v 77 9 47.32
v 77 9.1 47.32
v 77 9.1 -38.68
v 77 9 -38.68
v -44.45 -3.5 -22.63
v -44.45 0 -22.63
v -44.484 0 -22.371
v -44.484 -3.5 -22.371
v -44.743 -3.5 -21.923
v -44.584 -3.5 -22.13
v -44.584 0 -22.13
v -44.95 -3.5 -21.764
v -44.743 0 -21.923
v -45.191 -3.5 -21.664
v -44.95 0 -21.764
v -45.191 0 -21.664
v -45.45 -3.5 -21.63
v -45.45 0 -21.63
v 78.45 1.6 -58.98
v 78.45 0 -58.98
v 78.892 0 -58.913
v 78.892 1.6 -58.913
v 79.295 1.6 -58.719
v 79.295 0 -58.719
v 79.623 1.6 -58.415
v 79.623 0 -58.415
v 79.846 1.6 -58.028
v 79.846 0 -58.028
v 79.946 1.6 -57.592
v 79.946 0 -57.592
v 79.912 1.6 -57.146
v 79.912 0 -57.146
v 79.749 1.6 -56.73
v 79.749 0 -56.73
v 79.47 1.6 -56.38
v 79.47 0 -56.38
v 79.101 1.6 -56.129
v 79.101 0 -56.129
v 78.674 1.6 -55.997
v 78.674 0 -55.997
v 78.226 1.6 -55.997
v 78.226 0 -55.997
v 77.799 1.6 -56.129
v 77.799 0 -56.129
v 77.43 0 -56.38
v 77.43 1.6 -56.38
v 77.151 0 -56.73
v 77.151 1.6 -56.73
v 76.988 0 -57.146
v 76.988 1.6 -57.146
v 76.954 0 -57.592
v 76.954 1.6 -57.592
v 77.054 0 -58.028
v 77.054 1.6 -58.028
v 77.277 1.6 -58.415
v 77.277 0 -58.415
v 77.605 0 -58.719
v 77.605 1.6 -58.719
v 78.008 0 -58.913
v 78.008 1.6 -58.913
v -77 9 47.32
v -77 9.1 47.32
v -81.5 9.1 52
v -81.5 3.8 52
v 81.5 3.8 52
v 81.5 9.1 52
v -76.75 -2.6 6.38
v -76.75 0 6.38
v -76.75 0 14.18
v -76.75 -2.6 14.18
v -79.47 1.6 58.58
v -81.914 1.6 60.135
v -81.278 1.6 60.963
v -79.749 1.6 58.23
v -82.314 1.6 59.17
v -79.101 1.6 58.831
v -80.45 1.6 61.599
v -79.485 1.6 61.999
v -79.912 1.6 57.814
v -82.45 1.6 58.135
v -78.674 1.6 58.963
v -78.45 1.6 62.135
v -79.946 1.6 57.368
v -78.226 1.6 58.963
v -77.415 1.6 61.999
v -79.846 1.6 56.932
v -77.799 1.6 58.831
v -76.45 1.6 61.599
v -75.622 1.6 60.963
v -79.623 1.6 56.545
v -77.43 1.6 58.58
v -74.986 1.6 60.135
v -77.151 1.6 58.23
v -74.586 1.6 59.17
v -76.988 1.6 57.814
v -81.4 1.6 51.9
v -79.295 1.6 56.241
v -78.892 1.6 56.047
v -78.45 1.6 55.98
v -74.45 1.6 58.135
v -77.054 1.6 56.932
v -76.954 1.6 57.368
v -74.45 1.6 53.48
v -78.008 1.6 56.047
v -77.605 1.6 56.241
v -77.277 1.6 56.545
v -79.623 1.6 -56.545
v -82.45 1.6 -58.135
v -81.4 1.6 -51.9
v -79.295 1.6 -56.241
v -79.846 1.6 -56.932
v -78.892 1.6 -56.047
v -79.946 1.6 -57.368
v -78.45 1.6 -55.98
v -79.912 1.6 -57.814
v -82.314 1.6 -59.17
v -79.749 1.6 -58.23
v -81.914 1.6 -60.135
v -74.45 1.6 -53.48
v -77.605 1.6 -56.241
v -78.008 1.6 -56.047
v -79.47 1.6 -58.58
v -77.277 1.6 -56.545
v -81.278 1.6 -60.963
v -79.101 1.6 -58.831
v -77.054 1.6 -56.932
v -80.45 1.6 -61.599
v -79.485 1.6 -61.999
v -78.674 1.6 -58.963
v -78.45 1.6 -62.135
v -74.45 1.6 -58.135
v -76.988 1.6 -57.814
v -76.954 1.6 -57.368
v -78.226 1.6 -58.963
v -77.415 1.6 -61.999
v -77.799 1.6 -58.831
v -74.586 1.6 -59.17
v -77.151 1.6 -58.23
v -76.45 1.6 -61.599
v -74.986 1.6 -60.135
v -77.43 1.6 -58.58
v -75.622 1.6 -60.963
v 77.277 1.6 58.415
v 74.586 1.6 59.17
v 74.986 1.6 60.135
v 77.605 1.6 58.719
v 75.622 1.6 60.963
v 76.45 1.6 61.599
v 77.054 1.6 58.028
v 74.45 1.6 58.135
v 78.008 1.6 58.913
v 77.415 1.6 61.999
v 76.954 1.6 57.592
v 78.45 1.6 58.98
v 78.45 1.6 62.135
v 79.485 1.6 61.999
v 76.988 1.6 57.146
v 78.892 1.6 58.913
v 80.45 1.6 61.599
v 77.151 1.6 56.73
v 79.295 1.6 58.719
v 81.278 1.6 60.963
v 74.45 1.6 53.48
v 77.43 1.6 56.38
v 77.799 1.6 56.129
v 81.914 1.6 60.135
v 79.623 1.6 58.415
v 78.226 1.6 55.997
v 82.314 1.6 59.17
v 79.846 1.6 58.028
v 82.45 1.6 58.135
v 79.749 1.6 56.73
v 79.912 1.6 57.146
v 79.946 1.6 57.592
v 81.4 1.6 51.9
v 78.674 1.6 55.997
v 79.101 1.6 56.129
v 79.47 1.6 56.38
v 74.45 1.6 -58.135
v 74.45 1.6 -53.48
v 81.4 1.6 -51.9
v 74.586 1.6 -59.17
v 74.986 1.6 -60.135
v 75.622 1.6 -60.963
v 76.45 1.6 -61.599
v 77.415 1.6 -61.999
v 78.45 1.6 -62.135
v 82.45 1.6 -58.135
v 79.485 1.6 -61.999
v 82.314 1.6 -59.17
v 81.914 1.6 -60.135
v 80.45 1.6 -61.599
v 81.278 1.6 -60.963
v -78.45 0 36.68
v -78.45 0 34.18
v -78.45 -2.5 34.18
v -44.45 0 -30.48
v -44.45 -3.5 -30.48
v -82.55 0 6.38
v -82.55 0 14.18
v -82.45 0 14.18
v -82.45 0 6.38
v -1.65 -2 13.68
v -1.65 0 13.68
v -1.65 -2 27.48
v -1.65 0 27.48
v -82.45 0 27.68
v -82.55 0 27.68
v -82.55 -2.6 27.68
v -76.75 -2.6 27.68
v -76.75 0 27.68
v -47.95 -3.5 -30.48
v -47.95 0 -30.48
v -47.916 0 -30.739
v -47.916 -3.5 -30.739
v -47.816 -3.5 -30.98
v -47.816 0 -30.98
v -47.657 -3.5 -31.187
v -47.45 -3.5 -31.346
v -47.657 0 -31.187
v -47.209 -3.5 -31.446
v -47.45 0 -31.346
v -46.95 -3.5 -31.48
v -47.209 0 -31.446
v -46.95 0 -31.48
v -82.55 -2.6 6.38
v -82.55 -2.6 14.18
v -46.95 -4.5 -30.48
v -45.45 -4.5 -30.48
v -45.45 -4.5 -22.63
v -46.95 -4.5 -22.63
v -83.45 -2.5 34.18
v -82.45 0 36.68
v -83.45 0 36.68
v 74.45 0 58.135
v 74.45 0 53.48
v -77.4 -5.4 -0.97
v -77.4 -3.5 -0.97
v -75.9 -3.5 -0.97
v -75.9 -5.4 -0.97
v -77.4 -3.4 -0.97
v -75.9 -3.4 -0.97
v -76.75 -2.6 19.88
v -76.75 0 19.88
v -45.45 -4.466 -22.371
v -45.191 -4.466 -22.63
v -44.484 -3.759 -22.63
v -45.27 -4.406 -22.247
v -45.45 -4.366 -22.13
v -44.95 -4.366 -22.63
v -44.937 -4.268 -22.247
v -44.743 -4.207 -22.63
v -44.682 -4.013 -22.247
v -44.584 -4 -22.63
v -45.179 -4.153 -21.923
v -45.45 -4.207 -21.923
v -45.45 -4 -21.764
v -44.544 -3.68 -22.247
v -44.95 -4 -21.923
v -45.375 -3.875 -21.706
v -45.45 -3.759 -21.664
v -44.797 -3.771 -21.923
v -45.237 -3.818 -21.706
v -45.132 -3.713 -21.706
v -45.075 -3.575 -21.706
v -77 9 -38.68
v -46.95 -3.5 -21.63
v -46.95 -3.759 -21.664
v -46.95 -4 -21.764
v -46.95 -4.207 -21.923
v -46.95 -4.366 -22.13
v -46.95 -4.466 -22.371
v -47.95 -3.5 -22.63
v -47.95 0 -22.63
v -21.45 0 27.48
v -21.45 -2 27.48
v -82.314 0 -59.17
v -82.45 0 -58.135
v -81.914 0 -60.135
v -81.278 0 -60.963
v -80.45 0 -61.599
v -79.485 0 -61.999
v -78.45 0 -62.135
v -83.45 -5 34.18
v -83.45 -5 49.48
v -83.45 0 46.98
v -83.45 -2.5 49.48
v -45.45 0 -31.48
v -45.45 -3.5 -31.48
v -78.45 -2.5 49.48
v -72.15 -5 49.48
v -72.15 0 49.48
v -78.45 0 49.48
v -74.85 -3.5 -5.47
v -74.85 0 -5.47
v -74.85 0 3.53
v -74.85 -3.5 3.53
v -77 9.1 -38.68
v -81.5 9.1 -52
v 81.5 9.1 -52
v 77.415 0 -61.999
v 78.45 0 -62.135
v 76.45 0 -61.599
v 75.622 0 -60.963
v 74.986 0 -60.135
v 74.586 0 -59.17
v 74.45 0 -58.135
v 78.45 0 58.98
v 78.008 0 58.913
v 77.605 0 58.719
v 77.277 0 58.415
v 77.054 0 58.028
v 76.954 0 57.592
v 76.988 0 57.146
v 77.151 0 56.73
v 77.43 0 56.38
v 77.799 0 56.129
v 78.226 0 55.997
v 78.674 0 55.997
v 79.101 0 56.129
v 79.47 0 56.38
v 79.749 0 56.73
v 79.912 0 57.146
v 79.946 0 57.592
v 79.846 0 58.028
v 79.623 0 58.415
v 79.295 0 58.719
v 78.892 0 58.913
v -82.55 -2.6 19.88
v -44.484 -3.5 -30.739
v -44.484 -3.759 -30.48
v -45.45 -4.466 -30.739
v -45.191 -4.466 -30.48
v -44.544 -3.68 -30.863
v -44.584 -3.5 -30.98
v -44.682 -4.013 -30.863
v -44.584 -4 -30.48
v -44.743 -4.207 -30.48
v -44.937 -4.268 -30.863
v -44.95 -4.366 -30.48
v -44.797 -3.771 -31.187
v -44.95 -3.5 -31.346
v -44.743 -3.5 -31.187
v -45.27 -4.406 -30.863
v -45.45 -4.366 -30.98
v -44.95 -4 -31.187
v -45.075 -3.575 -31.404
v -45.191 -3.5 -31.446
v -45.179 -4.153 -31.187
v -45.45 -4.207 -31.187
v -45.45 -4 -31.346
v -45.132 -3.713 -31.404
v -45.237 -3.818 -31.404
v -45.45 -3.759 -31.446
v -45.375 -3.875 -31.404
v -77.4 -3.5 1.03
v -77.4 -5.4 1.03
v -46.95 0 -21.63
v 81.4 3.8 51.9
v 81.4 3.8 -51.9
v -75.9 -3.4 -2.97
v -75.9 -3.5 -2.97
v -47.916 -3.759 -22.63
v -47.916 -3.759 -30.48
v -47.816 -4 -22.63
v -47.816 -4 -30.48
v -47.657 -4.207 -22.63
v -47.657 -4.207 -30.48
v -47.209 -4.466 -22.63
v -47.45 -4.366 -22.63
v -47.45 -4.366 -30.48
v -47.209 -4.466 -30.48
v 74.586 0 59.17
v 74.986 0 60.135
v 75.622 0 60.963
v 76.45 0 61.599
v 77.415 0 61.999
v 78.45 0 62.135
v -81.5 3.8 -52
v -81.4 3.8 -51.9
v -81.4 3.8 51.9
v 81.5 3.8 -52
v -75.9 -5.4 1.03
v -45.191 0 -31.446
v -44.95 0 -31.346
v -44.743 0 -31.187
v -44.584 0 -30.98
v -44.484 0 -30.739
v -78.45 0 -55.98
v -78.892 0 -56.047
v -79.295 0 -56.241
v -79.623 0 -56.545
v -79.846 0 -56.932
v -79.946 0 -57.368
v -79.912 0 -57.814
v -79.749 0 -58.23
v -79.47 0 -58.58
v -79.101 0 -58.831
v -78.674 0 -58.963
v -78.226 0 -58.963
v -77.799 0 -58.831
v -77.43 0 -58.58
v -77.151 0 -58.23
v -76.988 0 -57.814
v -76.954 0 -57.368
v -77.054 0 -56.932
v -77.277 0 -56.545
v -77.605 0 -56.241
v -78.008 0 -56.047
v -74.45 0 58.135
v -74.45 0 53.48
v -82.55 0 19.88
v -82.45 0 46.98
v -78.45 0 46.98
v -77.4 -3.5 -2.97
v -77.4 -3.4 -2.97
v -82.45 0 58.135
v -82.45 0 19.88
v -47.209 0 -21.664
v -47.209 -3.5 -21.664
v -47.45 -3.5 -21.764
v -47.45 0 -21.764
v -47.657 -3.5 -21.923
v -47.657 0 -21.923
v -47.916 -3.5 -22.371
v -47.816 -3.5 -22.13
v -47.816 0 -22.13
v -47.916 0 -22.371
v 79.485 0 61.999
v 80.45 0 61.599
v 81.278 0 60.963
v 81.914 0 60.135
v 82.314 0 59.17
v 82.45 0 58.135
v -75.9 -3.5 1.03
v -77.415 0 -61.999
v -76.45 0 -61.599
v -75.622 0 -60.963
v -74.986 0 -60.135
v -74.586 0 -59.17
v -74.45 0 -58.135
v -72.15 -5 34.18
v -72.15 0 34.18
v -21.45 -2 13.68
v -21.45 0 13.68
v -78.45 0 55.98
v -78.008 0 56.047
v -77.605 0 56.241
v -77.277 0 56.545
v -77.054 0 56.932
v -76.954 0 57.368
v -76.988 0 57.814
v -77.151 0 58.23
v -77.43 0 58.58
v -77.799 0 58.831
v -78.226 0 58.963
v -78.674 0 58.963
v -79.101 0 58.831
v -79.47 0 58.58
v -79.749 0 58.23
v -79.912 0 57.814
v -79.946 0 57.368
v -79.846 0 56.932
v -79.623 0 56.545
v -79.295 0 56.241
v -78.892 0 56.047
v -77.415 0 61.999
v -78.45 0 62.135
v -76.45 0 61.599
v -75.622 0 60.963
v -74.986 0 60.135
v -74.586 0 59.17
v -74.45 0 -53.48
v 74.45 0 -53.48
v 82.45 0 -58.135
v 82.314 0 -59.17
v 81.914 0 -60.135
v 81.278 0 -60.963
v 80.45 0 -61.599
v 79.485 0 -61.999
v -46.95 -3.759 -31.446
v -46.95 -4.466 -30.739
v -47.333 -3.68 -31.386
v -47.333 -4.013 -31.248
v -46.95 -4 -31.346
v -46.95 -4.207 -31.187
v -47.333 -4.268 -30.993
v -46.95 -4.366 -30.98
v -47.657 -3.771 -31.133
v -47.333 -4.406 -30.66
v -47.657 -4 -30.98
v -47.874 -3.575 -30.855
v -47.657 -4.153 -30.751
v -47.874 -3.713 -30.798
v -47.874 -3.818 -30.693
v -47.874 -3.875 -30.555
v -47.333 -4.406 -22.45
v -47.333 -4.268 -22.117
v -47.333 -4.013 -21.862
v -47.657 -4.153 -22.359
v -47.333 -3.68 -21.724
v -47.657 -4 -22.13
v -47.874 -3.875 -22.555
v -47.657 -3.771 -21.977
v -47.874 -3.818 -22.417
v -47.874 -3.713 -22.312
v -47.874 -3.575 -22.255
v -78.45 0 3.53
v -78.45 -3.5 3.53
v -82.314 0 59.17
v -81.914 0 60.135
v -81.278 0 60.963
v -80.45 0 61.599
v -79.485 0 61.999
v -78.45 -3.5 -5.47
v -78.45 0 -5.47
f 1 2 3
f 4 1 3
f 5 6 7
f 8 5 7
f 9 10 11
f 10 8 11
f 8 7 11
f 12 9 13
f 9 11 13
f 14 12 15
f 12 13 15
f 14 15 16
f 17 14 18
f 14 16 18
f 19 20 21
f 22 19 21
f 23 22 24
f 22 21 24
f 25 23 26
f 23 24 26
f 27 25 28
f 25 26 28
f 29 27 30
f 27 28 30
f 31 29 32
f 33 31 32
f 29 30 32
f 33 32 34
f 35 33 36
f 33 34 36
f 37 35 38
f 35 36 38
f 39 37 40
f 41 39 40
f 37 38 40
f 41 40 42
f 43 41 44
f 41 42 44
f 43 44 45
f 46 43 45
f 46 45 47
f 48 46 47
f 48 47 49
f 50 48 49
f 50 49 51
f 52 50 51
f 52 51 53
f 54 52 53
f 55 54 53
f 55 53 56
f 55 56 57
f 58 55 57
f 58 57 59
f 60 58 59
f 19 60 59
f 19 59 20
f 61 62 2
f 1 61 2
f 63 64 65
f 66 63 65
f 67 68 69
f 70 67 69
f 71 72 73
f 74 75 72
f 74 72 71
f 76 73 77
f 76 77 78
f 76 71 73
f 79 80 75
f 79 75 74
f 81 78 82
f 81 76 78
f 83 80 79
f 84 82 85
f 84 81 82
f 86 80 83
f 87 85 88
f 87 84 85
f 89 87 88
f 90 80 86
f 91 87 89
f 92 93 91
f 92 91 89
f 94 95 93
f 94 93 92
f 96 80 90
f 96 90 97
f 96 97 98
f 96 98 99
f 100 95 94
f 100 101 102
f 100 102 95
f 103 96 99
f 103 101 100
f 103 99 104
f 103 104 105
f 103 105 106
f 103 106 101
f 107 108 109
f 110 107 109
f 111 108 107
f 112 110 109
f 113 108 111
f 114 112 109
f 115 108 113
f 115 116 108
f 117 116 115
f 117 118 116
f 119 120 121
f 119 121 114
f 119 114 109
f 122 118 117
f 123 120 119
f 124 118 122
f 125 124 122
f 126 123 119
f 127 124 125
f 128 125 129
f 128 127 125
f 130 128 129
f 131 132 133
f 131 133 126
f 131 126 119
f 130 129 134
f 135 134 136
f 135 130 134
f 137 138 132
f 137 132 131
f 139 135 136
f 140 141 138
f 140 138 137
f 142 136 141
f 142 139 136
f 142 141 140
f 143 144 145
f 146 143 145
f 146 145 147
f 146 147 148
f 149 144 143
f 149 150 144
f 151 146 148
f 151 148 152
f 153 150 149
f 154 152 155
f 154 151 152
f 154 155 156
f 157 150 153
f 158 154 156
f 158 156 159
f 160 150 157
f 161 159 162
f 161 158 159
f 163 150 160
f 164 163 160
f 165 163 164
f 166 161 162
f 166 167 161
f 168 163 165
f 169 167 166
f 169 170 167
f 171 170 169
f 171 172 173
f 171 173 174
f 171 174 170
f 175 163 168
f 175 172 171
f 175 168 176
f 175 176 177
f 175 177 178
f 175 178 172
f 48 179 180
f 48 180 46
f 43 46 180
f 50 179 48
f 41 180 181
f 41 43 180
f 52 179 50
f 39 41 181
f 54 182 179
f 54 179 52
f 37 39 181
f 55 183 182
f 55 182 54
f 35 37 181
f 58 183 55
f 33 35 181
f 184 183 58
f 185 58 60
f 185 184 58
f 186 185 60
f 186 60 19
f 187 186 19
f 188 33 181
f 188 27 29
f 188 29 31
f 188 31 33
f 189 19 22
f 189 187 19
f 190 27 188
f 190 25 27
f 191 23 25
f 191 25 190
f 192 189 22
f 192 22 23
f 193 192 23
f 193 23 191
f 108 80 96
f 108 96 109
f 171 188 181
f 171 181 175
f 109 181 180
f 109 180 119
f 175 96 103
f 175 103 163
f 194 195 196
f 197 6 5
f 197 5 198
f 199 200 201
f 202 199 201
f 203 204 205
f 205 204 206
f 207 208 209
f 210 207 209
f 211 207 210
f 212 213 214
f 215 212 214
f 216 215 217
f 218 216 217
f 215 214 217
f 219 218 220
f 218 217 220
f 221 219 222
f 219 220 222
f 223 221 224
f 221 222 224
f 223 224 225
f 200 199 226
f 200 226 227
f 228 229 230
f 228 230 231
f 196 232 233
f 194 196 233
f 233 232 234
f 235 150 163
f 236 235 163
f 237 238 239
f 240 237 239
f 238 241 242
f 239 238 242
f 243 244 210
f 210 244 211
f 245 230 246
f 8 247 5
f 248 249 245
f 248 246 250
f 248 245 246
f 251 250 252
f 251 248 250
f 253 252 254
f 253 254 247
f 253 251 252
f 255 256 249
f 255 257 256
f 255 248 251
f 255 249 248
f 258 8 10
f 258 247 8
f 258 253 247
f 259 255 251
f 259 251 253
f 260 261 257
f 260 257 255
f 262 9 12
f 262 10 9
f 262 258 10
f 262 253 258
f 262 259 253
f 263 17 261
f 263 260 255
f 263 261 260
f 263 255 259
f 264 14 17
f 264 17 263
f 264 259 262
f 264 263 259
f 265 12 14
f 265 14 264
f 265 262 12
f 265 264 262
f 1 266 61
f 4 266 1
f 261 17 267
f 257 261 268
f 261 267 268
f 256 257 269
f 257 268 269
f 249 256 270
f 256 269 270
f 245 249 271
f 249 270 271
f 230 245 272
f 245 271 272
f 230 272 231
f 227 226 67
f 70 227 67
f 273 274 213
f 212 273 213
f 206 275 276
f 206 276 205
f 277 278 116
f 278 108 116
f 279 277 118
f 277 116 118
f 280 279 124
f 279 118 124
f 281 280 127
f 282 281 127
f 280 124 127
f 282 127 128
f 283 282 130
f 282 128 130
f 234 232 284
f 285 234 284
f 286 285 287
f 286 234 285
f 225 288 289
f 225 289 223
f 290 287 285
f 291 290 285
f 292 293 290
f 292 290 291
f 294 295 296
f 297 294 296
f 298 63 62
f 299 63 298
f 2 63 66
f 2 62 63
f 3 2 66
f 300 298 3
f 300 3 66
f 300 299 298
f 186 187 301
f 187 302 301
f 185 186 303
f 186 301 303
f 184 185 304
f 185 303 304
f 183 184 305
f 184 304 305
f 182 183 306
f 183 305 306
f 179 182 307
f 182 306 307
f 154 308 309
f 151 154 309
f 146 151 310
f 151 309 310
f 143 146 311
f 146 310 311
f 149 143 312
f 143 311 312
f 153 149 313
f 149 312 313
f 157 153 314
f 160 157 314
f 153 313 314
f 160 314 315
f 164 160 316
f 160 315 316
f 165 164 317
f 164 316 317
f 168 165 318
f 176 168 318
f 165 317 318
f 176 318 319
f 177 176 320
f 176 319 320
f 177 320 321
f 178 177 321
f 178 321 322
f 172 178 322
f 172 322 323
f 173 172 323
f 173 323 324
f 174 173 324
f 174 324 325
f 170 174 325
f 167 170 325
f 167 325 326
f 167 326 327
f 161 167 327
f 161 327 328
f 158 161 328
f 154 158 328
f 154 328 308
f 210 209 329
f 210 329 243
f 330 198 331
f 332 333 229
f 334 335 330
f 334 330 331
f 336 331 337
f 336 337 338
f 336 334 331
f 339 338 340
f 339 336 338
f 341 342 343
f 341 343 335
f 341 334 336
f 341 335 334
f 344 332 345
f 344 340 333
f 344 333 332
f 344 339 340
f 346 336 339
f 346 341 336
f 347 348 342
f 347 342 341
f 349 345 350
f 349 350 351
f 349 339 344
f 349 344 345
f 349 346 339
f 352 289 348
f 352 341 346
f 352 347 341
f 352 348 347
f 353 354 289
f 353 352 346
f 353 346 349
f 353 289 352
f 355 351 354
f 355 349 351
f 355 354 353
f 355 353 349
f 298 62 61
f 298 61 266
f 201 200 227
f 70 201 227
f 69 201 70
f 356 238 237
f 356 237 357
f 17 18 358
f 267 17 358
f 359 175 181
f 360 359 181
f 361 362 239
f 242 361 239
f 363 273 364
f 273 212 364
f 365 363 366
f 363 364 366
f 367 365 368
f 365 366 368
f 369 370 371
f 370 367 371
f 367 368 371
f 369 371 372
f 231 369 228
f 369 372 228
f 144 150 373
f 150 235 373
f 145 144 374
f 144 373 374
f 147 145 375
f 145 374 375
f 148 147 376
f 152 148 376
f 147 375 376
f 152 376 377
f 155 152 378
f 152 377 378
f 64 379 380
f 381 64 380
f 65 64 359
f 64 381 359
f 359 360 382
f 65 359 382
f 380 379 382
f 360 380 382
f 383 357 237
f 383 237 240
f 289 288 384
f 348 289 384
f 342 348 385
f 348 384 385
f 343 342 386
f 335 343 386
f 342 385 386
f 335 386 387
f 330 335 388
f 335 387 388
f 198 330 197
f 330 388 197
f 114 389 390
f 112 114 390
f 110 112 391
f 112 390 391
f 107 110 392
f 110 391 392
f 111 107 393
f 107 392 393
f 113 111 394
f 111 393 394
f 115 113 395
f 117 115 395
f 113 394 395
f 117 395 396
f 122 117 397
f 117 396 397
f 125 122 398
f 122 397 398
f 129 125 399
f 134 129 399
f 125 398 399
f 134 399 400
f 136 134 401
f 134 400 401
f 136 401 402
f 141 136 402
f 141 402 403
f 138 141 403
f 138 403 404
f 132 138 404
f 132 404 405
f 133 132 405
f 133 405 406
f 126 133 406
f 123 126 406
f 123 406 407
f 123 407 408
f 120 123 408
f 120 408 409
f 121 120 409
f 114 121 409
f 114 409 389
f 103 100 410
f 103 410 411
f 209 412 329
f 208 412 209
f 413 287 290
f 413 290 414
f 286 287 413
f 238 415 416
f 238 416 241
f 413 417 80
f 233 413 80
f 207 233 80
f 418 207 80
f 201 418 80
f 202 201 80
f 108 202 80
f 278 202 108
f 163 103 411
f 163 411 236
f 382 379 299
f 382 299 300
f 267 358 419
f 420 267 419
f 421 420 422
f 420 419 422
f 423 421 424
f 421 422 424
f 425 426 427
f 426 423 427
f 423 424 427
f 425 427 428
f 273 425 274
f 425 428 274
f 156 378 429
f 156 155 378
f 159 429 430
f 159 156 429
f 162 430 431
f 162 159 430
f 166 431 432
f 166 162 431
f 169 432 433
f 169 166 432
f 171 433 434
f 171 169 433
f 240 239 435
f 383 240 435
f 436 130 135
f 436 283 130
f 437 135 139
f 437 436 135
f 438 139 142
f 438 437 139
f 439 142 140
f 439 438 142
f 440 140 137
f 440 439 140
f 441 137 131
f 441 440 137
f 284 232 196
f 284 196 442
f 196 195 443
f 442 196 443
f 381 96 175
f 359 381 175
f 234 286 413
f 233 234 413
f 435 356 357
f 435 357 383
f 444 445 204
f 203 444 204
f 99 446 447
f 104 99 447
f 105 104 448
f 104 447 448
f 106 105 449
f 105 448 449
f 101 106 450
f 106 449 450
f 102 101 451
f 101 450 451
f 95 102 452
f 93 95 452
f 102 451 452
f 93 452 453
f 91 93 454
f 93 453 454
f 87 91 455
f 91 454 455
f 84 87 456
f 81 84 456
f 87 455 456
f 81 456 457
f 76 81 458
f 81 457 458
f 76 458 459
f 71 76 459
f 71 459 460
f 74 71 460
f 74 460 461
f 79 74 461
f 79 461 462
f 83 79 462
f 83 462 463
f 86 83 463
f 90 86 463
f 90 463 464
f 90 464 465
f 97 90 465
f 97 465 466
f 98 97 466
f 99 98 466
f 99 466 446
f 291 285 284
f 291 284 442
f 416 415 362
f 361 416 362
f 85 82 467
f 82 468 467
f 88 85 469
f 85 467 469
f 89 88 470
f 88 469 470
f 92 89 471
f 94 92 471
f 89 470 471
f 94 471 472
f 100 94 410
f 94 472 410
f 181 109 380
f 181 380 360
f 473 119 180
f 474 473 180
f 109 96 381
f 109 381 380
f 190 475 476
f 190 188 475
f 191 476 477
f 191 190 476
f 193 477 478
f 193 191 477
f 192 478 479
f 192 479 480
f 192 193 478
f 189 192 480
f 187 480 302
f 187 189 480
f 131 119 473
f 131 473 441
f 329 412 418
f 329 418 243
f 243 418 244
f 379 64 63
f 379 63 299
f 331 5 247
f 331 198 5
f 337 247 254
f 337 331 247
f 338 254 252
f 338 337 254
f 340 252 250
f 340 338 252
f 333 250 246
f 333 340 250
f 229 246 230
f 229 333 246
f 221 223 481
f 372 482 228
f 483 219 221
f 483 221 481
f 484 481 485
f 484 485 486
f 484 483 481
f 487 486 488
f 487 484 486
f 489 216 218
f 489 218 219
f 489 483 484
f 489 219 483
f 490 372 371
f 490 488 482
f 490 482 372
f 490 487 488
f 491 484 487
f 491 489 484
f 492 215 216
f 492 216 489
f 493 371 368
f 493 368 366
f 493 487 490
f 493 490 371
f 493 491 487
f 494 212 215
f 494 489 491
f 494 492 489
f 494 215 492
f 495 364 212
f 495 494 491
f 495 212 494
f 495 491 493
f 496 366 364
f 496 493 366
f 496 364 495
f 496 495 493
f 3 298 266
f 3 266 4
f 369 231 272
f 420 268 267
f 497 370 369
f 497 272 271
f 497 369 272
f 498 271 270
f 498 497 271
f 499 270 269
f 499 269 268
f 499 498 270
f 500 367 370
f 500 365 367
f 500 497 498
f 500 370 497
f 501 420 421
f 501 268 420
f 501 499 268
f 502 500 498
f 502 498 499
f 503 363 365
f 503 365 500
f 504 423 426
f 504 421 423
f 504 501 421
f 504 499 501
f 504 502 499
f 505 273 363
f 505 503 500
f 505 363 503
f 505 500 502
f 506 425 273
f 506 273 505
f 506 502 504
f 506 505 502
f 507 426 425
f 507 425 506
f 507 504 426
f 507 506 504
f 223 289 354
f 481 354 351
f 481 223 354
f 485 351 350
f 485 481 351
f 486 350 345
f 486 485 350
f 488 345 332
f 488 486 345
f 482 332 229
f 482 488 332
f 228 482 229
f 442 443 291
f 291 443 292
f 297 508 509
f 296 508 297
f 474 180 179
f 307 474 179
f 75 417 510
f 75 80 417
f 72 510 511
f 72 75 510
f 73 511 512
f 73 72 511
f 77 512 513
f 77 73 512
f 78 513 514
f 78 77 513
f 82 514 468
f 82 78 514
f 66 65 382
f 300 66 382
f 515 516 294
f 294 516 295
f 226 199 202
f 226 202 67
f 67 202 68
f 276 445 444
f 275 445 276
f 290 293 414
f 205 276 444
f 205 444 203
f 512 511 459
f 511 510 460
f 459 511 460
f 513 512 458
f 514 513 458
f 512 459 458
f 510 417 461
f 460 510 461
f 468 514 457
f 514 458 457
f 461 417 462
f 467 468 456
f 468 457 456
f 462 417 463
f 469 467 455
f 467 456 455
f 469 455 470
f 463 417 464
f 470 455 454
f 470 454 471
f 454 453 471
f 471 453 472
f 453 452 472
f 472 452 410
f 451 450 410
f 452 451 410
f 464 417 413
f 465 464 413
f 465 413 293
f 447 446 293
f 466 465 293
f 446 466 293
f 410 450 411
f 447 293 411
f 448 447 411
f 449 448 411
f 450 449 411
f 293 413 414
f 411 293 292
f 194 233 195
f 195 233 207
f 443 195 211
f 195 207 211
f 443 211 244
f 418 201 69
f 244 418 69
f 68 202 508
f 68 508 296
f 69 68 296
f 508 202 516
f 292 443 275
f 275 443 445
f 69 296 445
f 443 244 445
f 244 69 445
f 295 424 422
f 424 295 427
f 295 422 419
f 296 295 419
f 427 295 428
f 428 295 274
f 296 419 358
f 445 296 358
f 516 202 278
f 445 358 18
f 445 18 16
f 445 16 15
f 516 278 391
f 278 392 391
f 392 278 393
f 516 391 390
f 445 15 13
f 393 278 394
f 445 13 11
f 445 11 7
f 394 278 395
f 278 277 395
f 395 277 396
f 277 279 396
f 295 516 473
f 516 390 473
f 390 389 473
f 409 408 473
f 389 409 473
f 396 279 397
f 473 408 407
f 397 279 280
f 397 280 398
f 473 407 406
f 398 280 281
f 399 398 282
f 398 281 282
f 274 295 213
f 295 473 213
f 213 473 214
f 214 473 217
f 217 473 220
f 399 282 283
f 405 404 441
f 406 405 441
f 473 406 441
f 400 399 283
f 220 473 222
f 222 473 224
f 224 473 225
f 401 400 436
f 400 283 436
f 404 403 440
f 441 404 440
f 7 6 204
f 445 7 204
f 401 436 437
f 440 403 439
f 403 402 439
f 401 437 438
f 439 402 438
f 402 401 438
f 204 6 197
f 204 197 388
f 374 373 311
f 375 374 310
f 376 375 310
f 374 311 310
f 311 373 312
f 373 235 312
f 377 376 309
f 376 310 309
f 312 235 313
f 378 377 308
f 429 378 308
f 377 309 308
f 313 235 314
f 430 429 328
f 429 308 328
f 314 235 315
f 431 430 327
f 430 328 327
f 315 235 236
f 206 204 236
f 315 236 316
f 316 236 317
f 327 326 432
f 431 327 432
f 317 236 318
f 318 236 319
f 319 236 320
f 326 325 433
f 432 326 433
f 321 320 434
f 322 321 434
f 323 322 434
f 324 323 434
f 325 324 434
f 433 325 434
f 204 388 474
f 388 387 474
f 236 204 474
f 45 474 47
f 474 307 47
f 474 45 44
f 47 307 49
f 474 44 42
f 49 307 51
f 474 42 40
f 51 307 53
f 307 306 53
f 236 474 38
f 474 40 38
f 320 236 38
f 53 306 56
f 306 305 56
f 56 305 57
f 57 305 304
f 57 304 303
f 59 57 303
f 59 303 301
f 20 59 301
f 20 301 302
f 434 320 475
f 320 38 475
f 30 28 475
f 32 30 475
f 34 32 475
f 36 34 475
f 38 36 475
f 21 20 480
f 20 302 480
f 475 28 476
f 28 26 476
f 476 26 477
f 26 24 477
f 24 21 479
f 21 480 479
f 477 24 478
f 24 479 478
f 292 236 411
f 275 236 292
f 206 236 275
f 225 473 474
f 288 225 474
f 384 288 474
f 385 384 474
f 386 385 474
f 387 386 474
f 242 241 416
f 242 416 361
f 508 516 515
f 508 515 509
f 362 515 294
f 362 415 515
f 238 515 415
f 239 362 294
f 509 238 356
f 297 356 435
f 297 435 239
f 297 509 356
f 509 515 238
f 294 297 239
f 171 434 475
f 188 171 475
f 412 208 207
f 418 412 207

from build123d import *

# Parameters (mm, degrees)
SKETCH_1_W          = 164.9
SKETCH_1_H          = 124.27
EXTRUDE_2_DEPTH     = 1.6
SKETCH_2_W          = 148.9
SKETCH_2_H          = 8.655
CUT_EXTRUDE_1_DEPTH = 104.253671726
SKETCH_3_W          = 163
SKETCH_3_H          = 104
EXTRUDE_4_DEPTH     = 7.5
SKETCH_4_W          = 11.3
SKETCH_4_H          = 15.3
EXTRUDE_5_DEPTH     = 5
SKETCH_6_W          = 3.5
SKETCH_6_H          = 9.85
EXTRUDE_6_DEPTH     = 4.5
FILLET_1_R          = 1
FILLET_2_R          = 1
SKETCH_7_R          = 1.5
CUT_EXTRUDE_3_DEPTH = 105.438837245
FILLET_3_R          = 4
SKETCH_9_W          = 154
SKETCH_9_H          = 86
CUT_EXTRUDE_5_DEPTH = 0.1
CUT_EXTRUDE_6_DEPTH = 5
SKETCH_11_W         = 5.8
SKETCH_11_H         = 7.8
EXTRUDE_7_DEPTH     = 2.6
SKETCH_12_W         = 3.6
SKETCH_12_H         = 9
EXTRUDE_8_DEPTH     = 3.5
SKETCH_13_W         = 1.5
SKETCH_13_H         = 4
CUT_EXTRUDE_7_DEPTH = 0.1
SKETCH_14_W         = 1.5
SKETCH_14_H         = 2
EXTRUDE_9_DEPTH     = 2
SKETCH_15_W         = 19.8
SKETCH_15_H         = 13.8
EXTRUDE_10_DEPTH    = 2
SKETCH_16_W         = 163
SKETCH_16_H         = 104
SKETCH_16_W_2       = 162.8
SKETCH_16_H_2       = 103.8
CUT_EXTRUDE_9_DEPTH = 2.2


# Some blends are built 0.0001 mm under size
with BuildPart() as part:
    # 草图1 → 凸台-拉伸2 (new body)
    with BuildSketch(Plane(origin=(0, 0, 0), x_dir=(1, 0, 0), z_dir=(0, 1, 0))):
        Rectangle(SKETCH_1_W, SKETCH_1_H)
    extrude(amount=EXTRUDE_2_DEPTH)

    # 草图2 → 切除-拉伸1 (cut, through all)
    with BuildSketch(Plane(origin=(0, 1.6, 0), x_dir=(1, 0, 0), z_dir=(0, 1, 0))):
        with Locations((0, 57.8075)):
            Rectangle(SKETCH_2_W, SKETCH_2_H)
        with Locations((0, -57.8075)):
            Rectangle(SKETCH_2_W, SKETCH_2_H)
    extrude(amount=-CUT_EXTRUDE_1_DEPTH, mode=Mode.SUBTRACT)

    # 草图3 → 凸台-拉伸4 (add)
    with BuildSketch(Plane(origin=(0, 1.6, 0), x_dir=(1, 0, 0), z_dir=(0, 1, 0))):
        Rectangle(SKETCH_3_W, SKETCH_3_H)
    extrude(amount=EXTRUDE_4_DEPTH)

    # 草图4 → 凸台-拉伸5 (add)
    with BuildSketch(Plane.XZ):
        with Locations((-77.8, 41.83)):
            Rectangle(SKETCH_4_W, SKETCH_4_H)
    extrude(amount=EXTRUDE_5_DEPTH)

    # 草图6 → 凸台-拉伸6 (add)
    with BuildSketch(Plane(origin=(0, 0, 0), x_dir=(-1, 0, 0), z_dir=(0, -1, 0))):
        with Locations((46.2, 26.555)):
            Rectangle(SKETCH_6_W, SKETCH_6_H)
    extrude(amount=EXTRUDE_6_DEPTH)

    # 圆角1
    fillet_1_edges = [part.edges().sort_by_distance(p)[0] for p in [
        (-44.45, -4.5, -26.555),
        (-46.2, -4.5, -21.63),
        (-47.95, -4.5, -26.555),
        (-46.2, -4.5, -31.48),
    ]]
    fillet(fillet_1_edges, radius=FILLET_1_R)

    # 圆角2
    # the kernel refuses this fillet: 1 mm, written as the material it takes off along each edge
    with BuildSketch(Plane(origin=(-46.95, -3.5, -22.63), x_dir=(0, 0, 1), z_dir=(-1, 0, 0))) as fillet_2_piece_1_section:
        Polygon((0, 0), (FILLET_2_R, 0), (FILLET_2_R, -FILLET_2_R), (0, -FILLET_2_R), align=None)
    fillet_2_piece_1 = extrude(amount=FILLET_2_R, mode=Mode.PRIVATE)
    fillet_2_piece_1 = fillet_2_piece_1 - Plane(origin=(-46.95, -3.5, -22.63), x_dir=(0, 0.7071067811865475, -0.7071067811865475), z_dir=(-1, 0, 0)) * Sphere(FILLET_2_R, mode=Mode.PRIVATE)
    add(fillet_2_piece_1, mode=Mode.SUBTRACT)
    with BuildSketch(Plane(origin=(-45.45, -3.5, -22.63), x_dir=(1, 0, 0), z_dir=(0, 0, 1))) as fillet_2_piece_2_section:
        Polygon((0, 0), (FILLET_2_R, 0), (FILLET_2_R, -FILLET_2_R), (0, -FILLET_2_R), align=None)
    fillet_2_piece_2 = extrude(amount=FILLET_2_R, mode=Mode.PRIVATE)
    fillet_2_piece_2 = fillet_2_piece_2 - Plane(origin=(-45.45, -3.5, -22.63), x_dir=(-0.7071067811865475, 0.7071067811865475, 0), z_dir=(0, 0, 1)) * Sphere(FILLET_2_R, mode=Mode.PRIVATE)
    add(fillet_2_piece_2, mode=Mode.SUBTRACT)
    with BuildSketch(Plane(origin=(-46.95, -3.5, -30.48), x_dir=(0, 0, -1), z_dir=(-1, 0, 0))) as fillet_2_piece_3_section:
        Polygon((0, 0), (FILLET_2_R, 0), (FILLET_2_R, FILLET_2_R), (0, FILLET_2_R), align=None)
    fillet_2_piece_3 = extrude(amount=FILLET_2_R, mode=Mode.PRIVATE)
    fillet_2_piece_3 = fillet_2_piece_3 - Plane(origin=(-46.95, -3.5, -30.48), x_dir=(0, 0.7071067811865475, 0.7071067811865475), z_dir=(-1, 0, 0)) * Sphere(FILLET_2_R, mode=Mode.PRIVATE)
    add(fillet_2_piece_3, mode=Mode.SUBTRACT)
    with BuildSketch(Plane(origin=(-45.45, -3.5, -30.48), x_dir=(1, 0, 0), z_dir=(0, 0, -1))) as fillet_2_piece_4_section:
        Polygon((0, 0), (FILLET_2_R, 0), (FILLET_2_R, FILLET_2_R), (0, FILLET_2_R), align=None)
    fillet_2_piece_4 = extrude(amount=FILLET_2_R, mode=Mode.PRIVATE)
    fillet_2_piece_4 = fillet_2_piece_4 - Plane(origin=(-45.45, -3.5, -30.48), x_dir=(-0.7071067811865475, 0.7071067811865475, 0), z_dir=(0, 0, -1)) * Sphere(FILLET_2_R, mode=Mode.PRIVATE)
    add(fillet_2_piece_4, mode=Mode.SUBTRACT)
    with BuildSketch(Plane(origin=(-44.45, 0, -31.48), x_dir=(-1, 0, 0), z_dir=(0, -1, 0)), Plane(origin=(-47.95, 0, -31.48), x_dir=(0, 0, 1), z_dir=(0, -1, 0))) as fillet_2_piece_5:
        with BuildLine():
            CenterArc((FILLET_2_R, -FILLET_2_R), FILLET_2_R, 90, 90)
            Line((0, -FILLET_2_R), (0, 0))
            Line((0, 0), (FILLET_2_R, 0))
        make_face()
    extrude(amount=3.5, mode=Mode.SUBTRACT)
    with BuildSketch(Plane(origin=(-47.95, 0, -21.63), x_dir=(0, 0, -1), z_dir=(0, -1, 0)), Plane(origin=(-44.45, 0, -21.63), x_dir=(-1, 0, 0), z_dir=(0, -1, 0))) as fillet_2_piece_6:
        with BuildLine():
            CenterArc((FILLET_2_R, FILLET_2_R), FILLET_2_R, 180, 90)
            Line((0, FILLET_2_R), (0, 0))
            Line((0, 0), (FILLET_2_R, 0))
        make_face()
    extrude(amount=3.5, mode=Mode.SUBTRACT)

    # 草图7 → 切除-拉伸3 (cut, through all)
    with BuildSketch(Plane.XZ):
        with Locations(Location((-78.45, 57.48, 0), (0, 0, 270))):
            Circle(SKETCH_7_R)
        with Locations(Location((78.45, 57.48, 0), (0, 0, 90))):
            Circle(SKETCH_7_R)
        with Locations(Location((78.45, -57.48, 0), (0, 0, 270))):
            Circle(SKETCH_7_R)
        with Locations(Location((-78.45, -57.48, 0), (0, 0, 90))):
            Circle(SKETCH_7_R)
    extrude(amount=-CUT_EXTRUDE_3_DEPTH, mode=Mode.SUBTRACT)

    # 圆角3
    fillet_3_edges = [part.edges().sort_by_distance(p)[0] for p in [
        (-74.45, 0.8, -62.135),
        (-82.45, 0.8, -62.135),
        (82.45, 0.8, -62.135),
        (74.45, 0.8, -62.135),
        (74.45, 0.8, 62.135),
        (82.45, 0.8, 62.135),
        (-74.45, 0.8, 62.135),
        (-82.45, 0.8, 62.135),
    ]]
    fillet(fillet_3_edges, radius=FILLET_3_R - 0.0001)  # a hair under: the kernel refuses the full size

    # 草图9 → 切除-拉伸5 (cut)
    with BuildSketch(Plane(origin=(0, 9.1, 0), x_dir=(1, 0, 0), z_dir=(0, 1, 0))):
        with Locations((0, -4.32)):
            Rectangle(SKETCH_9_W, SKETCH_9_H)
    extrude(amount=-CUT_EXTRUDE_5_DEPTH, mode=Mode.SUBTRACT)

    # 草图10 → 切除-拉伸6 (cut)
    with BuildSketch(Plane.ZY.offset(83.45)):
        Polygon((49.48, -2.5), (46.98, 0), (49.48, 0), align=None)
        Polygon((34.18, 0), (34.18, -2.5), (36.68, 0), align=None)
    extrude(amount=-CUT_EXTRUDE_6_DEPTH, mode=Mode.SUBTRACT)

    # 草图11 → 凸台-拉伸7 (add)
    with BuildSketch(Plane.XZ):
        with Locations((-79.65, 23.78)):
            Rectangle(SKETCH_11_W, SKETCH_11_H)
        with Locations((-79.65, 10.28)):
            Rectangle(SKETCH_11_W, SKETCH_11_H)
    extrude(amount=EXTRUDE_7_DEPTH)

    # 草图12 → 凸台-拉伸8 (add)
    with BuildSketch(Plane.XZ):
        with Locations((-76.65, -0.97)):
            Rectangle(SKETCH_12_W, SKETCH_12_H)
    extrude(amount=EXTRUDE_8_DEPTH)

    # 草图13 → 切除-拉伸7 (cut)
    with BuildSketch(Plane.XZ.offset(3.5)):
        with Locations((-76.65, -0.97)):
            Rectangle(SKETCH_13_W, SKETCH_13_H)
    extrude(amount=-CUT_EXTRUDE_7_DEPTH, mode=Mode.SUBTRACT)

    # 草图14 → 凸台-拉伸9 (add)
    with BuildSketch(Plane.XZ.offset(3.4)):
        with Locations((-76.65, 0.03)):
            Rectangle(SKETCH_14_W, SKETCH_14_H)
    extrude(amount=EXTRUDE_9_DEPTH)

    # 草图15 → 凸台-拉伸10 (add)
    with BuildSketch(Plane.XZ):
        with Locations((-11.55, 20.58)):
            Rectangle(SKETCH_15_W, SKETCH_15_H)
    extrude(amount=EXTRUDE_10_DEPTH)

    # 草图16 → 切除-拉伸9 (cut)
    with BuildSketch(Plane(origin=(0, 1.6, 0), x_dir=(1, 0, 0), z_dir=(0, 1, 0))):
        Rectangle(SKETCH_16_W, SKETCH_16_H)
        Rectangle(SKETCH_16_W_2, SKETCH_16_H_2, mode=Mode.SUBTRACT)
    extrude(amount=CUT_EXTRUDE_9_DEPTH, mode=Mode.SUBTRACT)


solid = part.part
